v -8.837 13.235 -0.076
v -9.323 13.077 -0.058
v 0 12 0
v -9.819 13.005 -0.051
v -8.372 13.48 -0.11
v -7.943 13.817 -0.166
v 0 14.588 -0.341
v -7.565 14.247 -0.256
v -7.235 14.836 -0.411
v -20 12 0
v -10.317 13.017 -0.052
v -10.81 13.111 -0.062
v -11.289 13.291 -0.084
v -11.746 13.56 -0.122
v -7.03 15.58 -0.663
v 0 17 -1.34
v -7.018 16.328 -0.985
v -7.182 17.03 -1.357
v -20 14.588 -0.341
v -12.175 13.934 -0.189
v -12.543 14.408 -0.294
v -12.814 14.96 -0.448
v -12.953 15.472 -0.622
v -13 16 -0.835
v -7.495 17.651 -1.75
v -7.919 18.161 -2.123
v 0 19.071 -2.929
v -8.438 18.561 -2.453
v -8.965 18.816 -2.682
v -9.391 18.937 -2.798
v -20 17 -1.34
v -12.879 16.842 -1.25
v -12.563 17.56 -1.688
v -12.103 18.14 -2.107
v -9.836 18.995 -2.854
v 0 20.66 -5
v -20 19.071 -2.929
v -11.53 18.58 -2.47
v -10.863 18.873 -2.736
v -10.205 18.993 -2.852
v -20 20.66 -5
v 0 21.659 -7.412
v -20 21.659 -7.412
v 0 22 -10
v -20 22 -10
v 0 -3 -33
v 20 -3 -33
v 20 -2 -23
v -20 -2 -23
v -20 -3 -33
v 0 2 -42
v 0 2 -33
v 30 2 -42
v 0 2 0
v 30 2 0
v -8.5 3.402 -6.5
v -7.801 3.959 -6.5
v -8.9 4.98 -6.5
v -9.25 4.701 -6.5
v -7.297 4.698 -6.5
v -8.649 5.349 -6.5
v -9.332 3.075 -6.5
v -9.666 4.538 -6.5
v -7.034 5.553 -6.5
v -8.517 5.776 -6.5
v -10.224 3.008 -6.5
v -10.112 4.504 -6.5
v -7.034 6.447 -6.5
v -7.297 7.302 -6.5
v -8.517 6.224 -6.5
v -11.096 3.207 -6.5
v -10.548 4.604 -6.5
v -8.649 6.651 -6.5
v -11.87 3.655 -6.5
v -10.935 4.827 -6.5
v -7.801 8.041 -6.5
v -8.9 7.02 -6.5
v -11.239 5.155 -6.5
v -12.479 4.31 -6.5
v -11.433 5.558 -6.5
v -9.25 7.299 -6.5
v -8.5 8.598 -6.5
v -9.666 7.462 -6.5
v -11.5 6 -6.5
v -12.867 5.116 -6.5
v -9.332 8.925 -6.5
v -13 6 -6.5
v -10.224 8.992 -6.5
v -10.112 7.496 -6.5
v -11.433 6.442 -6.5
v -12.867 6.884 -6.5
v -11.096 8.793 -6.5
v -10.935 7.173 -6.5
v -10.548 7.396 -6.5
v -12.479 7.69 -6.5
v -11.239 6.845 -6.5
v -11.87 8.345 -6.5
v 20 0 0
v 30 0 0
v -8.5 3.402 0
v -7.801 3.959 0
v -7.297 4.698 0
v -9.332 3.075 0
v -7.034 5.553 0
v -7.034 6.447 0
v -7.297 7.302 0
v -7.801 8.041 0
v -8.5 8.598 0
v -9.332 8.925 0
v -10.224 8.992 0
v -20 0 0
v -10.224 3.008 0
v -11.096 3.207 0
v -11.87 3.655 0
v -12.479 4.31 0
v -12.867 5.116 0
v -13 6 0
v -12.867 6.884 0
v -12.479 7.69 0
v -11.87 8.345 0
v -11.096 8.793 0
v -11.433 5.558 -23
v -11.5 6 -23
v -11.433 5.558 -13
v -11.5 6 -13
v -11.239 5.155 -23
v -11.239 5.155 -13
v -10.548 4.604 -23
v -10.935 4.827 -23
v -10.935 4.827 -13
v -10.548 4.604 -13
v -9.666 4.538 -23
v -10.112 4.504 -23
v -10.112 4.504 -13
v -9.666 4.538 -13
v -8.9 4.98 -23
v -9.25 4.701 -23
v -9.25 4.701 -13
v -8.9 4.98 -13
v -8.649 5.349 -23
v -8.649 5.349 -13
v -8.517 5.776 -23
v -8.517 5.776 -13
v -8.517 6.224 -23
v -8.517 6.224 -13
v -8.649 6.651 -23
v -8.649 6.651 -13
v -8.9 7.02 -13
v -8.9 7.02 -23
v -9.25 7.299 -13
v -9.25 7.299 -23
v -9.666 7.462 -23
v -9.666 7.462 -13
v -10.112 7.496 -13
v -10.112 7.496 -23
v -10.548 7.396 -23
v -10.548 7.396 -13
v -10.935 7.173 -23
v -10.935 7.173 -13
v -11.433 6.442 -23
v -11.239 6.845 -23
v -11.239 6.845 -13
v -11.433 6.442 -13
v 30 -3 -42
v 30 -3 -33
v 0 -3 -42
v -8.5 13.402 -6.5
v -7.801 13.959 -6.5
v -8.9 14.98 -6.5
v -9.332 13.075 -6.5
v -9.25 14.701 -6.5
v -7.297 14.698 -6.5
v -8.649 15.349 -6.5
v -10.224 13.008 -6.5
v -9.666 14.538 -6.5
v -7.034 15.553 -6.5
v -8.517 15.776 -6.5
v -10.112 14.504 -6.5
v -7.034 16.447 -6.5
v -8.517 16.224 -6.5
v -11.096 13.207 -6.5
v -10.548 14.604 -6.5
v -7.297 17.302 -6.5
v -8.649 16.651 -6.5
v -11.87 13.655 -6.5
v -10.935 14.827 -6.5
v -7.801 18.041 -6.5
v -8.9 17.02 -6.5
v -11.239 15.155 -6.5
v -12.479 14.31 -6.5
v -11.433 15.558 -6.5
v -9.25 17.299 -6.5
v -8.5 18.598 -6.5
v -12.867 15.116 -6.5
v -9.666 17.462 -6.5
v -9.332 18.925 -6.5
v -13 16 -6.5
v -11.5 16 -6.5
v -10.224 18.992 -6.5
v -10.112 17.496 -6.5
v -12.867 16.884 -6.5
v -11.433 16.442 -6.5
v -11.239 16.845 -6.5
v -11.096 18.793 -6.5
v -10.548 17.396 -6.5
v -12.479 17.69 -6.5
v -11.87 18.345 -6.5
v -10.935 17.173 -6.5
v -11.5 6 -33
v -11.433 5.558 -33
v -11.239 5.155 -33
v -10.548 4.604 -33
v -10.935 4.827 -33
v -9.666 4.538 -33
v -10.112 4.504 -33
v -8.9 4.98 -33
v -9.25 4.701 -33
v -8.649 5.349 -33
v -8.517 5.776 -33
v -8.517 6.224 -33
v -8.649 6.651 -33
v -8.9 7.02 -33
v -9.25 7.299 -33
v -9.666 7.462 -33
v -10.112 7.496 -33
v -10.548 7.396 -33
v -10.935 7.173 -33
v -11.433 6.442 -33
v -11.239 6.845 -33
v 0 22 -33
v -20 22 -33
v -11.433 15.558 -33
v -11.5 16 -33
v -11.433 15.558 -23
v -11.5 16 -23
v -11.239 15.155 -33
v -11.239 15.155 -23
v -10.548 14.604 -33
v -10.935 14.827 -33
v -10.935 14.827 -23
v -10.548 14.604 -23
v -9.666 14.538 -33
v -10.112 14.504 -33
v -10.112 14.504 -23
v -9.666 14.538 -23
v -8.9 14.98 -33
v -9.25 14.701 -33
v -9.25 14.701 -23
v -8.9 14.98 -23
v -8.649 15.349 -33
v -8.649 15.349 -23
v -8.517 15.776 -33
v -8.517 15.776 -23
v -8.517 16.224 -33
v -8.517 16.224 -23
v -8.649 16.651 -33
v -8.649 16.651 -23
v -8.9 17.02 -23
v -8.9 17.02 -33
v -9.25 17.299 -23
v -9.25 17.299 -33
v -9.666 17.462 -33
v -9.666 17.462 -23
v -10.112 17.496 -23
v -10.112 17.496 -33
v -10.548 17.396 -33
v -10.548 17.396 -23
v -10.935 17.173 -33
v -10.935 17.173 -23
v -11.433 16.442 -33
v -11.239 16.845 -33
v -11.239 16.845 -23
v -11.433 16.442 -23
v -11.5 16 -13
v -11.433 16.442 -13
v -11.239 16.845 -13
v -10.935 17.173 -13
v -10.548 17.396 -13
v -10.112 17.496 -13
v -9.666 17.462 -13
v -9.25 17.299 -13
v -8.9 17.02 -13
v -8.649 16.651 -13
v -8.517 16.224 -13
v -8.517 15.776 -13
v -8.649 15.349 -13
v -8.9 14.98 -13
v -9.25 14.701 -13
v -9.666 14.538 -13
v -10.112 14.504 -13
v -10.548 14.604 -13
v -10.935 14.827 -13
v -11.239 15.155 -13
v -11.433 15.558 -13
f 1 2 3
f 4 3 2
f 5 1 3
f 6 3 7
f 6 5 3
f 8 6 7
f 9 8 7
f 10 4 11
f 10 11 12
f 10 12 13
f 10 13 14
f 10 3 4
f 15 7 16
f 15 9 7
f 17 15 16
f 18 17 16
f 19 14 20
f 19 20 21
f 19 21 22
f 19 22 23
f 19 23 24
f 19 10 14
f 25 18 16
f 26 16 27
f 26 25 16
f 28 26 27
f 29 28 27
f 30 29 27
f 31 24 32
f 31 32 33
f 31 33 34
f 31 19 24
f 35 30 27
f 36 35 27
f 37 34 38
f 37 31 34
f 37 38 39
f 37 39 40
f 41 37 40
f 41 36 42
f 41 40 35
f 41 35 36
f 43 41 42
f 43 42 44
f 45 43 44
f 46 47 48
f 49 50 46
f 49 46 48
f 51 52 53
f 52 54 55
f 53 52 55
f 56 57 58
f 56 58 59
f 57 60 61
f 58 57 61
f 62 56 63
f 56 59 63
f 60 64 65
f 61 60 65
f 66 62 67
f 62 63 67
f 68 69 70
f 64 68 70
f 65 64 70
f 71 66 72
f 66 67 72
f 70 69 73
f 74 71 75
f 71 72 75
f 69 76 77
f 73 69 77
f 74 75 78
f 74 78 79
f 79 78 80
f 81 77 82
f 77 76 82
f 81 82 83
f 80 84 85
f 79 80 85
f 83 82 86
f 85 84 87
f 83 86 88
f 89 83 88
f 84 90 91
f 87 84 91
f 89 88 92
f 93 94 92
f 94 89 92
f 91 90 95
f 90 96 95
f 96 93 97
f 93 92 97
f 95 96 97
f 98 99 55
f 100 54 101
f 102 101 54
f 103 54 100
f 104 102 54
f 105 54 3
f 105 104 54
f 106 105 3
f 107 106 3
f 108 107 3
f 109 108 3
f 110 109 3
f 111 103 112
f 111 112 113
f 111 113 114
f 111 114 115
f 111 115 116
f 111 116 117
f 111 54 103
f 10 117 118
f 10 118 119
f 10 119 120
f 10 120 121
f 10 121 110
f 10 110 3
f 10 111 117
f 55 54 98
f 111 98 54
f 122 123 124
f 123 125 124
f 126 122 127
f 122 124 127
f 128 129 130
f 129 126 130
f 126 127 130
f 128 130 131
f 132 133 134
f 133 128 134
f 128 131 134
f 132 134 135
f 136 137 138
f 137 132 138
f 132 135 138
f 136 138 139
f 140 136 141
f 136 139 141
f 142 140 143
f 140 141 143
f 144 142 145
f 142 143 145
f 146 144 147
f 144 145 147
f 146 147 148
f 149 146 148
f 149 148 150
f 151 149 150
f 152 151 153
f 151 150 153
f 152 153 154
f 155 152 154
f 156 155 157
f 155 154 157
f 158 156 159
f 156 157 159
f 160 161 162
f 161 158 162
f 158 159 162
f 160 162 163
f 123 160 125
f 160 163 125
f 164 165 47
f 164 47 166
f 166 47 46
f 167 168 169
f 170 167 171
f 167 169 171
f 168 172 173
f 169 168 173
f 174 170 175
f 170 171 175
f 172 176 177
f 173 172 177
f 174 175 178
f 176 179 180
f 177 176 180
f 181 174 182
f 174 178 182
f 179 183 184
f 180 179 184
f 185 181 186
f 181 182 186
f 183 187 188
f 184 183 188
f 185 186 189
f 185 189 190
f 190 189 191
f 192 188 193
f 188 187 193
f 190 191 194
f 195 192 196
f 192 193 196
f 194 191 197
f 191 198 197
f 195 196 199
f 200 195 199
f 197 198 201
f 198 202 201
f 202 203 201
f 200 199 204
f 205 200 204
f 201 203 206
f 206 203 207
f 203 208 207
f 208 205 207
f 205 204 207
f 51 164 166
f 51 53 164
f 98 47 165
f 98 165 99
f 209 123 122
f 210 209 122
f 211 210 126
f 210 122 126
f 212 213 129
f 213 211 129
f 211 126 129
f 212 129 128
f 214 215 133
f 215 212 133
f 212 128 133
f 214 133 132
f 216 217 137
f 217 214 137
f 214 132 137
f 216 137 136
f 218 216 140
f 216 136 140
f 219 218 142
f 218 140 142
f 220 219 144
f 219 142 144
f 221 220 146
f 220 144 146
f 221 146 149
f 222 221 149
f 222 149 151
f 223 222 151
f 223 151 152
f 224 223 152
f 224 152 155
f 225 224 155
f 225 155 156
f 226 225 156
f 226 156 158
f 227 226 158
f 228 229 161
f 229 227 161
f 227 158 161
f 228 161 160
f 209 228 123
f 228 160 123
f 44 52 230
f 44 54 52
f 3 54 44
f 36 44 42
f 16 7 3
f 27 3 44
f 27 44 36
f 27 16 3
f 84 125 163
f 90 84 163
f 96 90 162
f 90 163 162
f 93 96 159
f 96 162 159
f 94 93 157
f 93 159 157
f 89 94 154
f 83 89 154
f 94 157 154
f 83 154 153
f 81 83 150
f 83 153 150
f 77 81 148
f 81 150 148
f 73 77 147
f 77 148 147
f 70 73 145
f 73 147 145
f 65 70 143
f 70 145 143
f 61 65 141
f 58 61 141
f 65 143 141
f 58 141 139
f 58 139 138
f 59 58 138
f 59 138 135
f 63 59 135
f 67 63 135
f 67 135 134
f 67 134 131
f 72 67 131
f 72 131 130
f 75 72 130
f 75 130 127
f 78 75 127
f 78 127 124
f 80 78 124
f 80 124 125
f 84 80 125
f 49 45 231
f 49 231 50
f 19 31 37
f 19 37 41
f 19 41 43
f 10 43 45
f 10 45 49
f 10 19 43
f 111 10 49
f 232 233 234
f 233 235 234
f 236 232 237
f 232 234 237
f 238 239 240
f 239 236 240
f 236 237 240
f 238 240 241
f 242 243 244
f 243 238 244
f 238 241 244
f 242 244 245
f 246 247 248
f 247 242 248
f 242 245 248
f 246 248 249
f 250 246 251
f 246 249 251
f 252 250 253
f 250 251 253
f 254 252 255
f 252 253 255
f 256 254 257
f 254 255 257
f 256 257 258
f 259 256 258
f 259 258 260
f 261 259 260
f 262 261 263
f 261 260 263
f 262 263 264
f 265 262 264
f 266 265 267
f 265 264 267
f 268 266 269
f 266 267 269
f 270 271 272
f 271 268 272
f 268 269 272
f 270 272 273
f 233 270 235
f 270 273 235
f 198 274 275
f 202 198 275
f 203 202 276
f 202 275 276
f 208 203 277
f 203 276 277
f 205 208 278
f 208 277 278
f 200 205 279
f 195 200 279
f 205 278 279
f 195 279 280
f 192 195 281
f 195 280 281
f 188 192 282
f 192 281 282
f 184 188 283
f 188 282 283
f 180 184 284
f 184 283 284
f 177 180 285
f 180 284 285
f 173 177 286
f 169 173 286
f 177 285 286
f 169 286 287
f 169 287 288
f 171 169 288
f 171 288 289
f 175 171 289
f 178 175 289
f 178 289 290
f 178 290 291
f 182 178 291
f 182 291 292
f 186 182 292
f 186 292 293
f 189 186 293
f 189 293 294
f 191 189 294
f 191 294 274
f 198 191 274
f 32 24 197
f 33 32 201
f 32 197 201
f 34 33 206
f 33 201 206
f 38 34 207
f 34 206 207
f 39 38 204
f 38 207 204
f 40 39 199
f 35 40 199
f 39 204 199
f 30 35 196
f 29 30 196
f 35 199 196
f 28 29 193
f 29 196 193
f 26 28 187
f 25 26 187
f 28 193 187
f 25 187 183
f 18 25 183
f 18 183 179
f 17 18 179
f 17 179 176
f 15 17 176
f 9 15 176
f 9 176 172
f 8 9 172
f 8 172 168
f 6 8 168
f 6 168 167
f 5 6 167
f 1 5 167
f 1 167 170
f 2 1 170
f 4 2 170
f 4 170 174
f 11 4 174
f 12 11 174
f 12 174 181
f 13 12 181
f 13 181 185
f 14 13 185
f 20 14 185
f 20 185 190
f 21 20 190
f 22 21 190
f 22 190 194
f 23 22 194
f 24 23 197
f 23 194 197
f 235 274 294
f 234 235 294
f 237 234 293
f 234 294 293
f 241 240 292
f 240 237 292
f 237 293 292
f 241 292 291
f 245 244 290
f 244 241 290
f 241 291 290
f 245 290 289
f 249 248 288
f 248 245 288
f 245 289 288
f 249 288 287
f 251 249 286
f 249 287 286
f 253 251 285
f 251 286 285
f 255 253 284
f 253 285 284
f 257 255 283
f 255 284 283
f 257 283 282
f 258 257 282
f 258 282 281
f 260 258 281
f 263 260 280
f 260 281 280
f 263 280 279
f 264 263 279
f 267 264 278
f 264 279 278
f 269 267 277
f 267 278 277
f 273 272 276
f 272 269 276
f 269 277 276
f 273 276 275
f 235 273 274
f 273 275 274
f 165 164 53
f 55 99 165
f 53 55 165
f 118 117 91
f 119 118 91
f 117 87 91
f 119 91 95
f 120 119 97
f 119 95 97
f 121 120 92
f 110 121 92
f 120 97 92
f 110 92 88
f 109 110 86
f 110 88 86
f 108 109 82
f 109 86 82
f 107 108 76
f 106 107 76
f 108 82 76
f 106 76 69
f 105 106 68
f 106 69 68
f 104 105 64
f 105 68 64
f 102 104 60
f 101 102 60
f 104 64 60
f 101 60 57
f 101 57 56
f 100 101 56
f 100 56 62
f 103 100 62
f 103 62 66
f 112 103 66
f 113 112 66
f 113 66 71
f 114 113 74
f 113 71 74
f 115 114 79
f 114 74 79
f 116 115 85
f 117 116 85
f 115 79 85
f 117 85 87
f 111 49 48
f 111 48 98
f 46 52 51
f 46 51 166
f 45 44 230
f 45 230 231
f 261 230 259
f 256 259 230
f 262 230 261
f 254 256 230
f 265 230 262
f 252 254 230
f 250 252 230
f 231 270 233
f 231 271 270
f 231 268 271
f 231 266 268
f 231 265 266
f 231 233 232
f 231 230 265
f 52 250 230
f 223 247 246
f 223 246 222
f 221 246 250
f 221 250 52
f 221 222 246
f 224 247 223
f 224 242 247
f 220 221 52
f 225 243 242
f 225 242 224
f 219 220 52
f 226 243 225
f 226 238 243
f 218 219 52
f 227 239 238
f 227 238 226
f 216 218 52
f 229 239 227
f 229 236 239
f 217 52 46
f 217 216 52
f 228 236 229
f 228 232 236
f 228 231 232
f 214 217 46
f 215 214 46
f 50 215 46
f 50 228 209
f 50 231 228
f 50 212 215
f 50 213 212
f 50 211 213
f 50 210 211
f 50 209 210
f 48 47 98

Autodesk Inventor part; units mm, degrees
sketch "Sketch1" plane through (0, 0, 0) normal (0, 1, 0) x (-1, 0, 0)
  line L0 (0, 0) -> (-20, 0)
  line L1 (-20, 0) -> (-20, -13)
  line L2 (-20, -13) -> (0, -13)
  line L3 (0, -13) -> (0, 0)
  line L4 (0, -13) -> (20, -13)
  line L5 (20, -13) -> (20, -10)
  line L6 (20, -10) -> (0, -10)
  line L7 (0, -10) -> (0, -13)
  line L8 (0, -13) -> (-20, -13)
  line L9 (-20, -13) -> (-20, -23)
  line L10 (-20, -23) -> (0, -23)
  line L11 (0, -23) -> (0, -13)
  line L12 (20, -10) -> (0, -10)
  line L13 (0, -10) -> (0, 0)
  line L14 (0, 0) -> (20, 0)
  line L15 (20, 0) -> (20, -10)
  dimension "d0" = 20
  dimension "d1" = 13
  dimension "d2" = 20
  dimension "d3" = 3
  dimension "d4" = 10
extrude "Extrusion1" add sketch "Sketch1" along normal blind 2 contours L3 L2 L1 L0 | L2 L11 L10 L9
extrude "Extrusion2" add sketch "Sketch1" along normal blind 22 contours L6 L5 L4 L3
extrude "Extrusion3" add sketch "Sketch1" along normal blind 2 contours L14 L15 L6 L3
ref_plane "Work Plane1" through (-10, 2, -13) normal (1, 0, 0) x (0, 0, -1)
sketch "Sketch2" plane through (-10, 2, -13) normal (1, 0, 0) x (0, 0, -1)
  line L0 (0, 20) -> (-3, 20) projected
  line L1 (-13, -2) -> (-13, 0) projected
  line L2 (-13, 0) -> (-3, 0)
  line L3 (-3, 0) -> (-3, 20) projected
  line L4 (-3, 0) -> (-3, 20)
  line L5 (-3, 20) -> (-13, 20)
  line L6 (-13, 20) -> (-13, 0)
  line L7 (-13, 0) -> (-3, 0)
  line L8 (-3, 0) -> (-3, 20)
extrude "Extrusion4" add sketch "Sketch2" along normal mid plane 20
fillet "Fillet1" radius 10 1 edges at (-10, 22, 0)
sketch "Sketch3" plane through (0, 0, -13) normal (0, 0, -1) x (-1, 0, 0)
  circle A0 centre (10, 16) radius 1.5
  line L0 (0, 22) -> (20, 22) projected
  circle A1 centre (10, 6) radius 1.5
  line L1 (0, 0) -> (20, 0) projected
  point P0 (10, 0)
  dimension "d14" = 3
  dimension "d15" = 6
  dimension "d16" = 3
  dimension "d18" = 6
extrude "Extrusion5" cut sketch "Sketch3" against normal blind 20
ref_plane "Work Plane2" through (0, 0, -6.5) normal (0, 0, -1) x (-1, 0, 0)
sketch "Sketch4" plane through (0, 0, -6.5) normal (0, 0, -1) x (-1, 0, 0)
  circle A0 centre (10, 16) radius 1.5 projected
  circle A1 centre (10, 16) radius 3
  circle A2 centre (10, 6) radius 1.5 projected
  circle A3 centre (10, 6) radius 3
  point P0 (0, 0)
  dimension "d21" = 6
  dimension "d22" = 6
extrude "Extrusion6" cut sketch "Sketch4" against normal blind 20
sketch "Sketch5" plane through (0, 0, -13) normal (0, 0, -1) x (-1, 0, 0)
  line L0 (0, 22) -> (20, 22) projected
  line L1 (0, 0) -> (20, 0) projected
  line L2 (0, 22) -> (20, 22)
  line L3 (20, 22) -> (20, 0)
  line L4 (20, 0) -> (0, 0)
  line L5 (0, 0) -> (0, 22)
  circle A0 centre (10, 16) radius 1.5 projected
  circle A1 centre (10, 16) radius 1.5
  circle A2 centre (10, 6) radius 1.5 projected
  circle A3 centre (10, 6) radius 1.5
extrude "Extrusion7" add sketch "Sketch5" along normal blind 10
ref_plane "Work Plane3" through (0, 0, 0) normal (1, 0, 0) x (0, 0, -1)
sketch "Sketch6" plane through (0, 0, 0) normal (1, 0, 0) x (0, 0, -1)
  line L0 (0, 0) -> (23, 0) projected
  line L1 (23, 0) -> (23, -2)
  line L2 (23, -2) -> (0, 0)
  line L3 (0, 0) -> (23, 0)
  dimension "d27" = 2
extrude "Extrusion8" add sketch "Sketch6" along normal mid plane 40
sketch "Sketch7" plane through (0, 22, -23) normal (0, 0, -1) x (-1, 0, 0)
  line L0 (20, 0) -> (0, 0) projected
  line L1 (20, -24) -> (20, -22) projected
  line L2 (0, 0) -> (20, 0)
  line L3 (20, 0) -> (20, -24)
  line L4 (20, -24) -> (0, -24)
  line L5 (0, -24) -> (0, 0)
  line L6 (0, -20) -> (-20, -20) projected
  line L7 (-20, -20) -> (0, -20)
  line L8 (0, -20) -> (0, -24)
  line L9 (0, -24) -> (-20, -24)
  line L10 (-20, -24) -> (-20, -20)
  circle A0 centre (10, -6) radius 1.5 projected
  circle A1 centre (10, -6) radius 1.5
  circle A2 centre (10, -16) radius 1.5 projected
  circle A3 centre (10, -16) radius 1.5
  point P0 (0, -22)
extrude "Extrusion9" add sketch "Sketch7" along normal blind 10
sketch "Sketch8" plane through (0, 0, 0) normal (1, 0, 0) x (0, 0, -1)
  line L0 (23, -2) -> (33, -2) projected
  line L1 (33, -2) -> (33, -3)
  line L2 (33, -3) -> (23, -2)
  point P0 (0, 0)
  dimension "d32" = 1
extrude "Extrusion10" add sketch "Sketch8" along normal mid plane 40
sketch "Sketch9" plane through (20, 0, 0) normal (1, 0, 0) x (0, 0, -1)
  line L0 (33, 2) -> (0, 2) projected
  line L1 (0, 2) -> (33, 2)
  line L2 (33, 2) -> (33, -3) projected
  line L3 (33, 2) -> (33, -3)
  line L4 (23, -2) -> (0, 0) projected
  line L5 (33, -3) -> (0, 0)
  line L6 (0, 0) -> (0, 2)
extrude "Extrusion11" add sketch "Sketch9" along normal blind 10
sketch "Sketch10" plane through (0, 22, -33) normal (0, 0, -1) x (-1, 0, 0)
  line L0 (0, -20) -> (-30, -20) projected
  line L1 (-30, -20) -> (0, -20)
  line L2 (0, -20) -> (0, -25)
  line L3 (-20, -25) -> (20, -25) projected
  line L4 (-30, -25) -> (-30, -20) projected
  line L5 (-30, -25) -> (-30, -20)
  line L6 (-20, -24) -> (-20, -25) projected
  line L7 (-20, -25) -> (-30, -25) projected
  line L8 (-20, -25) -> (-30, -25)
  point P0 (0, -22)
extrude "Extrusion12" add sketch "Sketch10" along normal blind 9
properties part number "Holder Motor Lifter 2"
